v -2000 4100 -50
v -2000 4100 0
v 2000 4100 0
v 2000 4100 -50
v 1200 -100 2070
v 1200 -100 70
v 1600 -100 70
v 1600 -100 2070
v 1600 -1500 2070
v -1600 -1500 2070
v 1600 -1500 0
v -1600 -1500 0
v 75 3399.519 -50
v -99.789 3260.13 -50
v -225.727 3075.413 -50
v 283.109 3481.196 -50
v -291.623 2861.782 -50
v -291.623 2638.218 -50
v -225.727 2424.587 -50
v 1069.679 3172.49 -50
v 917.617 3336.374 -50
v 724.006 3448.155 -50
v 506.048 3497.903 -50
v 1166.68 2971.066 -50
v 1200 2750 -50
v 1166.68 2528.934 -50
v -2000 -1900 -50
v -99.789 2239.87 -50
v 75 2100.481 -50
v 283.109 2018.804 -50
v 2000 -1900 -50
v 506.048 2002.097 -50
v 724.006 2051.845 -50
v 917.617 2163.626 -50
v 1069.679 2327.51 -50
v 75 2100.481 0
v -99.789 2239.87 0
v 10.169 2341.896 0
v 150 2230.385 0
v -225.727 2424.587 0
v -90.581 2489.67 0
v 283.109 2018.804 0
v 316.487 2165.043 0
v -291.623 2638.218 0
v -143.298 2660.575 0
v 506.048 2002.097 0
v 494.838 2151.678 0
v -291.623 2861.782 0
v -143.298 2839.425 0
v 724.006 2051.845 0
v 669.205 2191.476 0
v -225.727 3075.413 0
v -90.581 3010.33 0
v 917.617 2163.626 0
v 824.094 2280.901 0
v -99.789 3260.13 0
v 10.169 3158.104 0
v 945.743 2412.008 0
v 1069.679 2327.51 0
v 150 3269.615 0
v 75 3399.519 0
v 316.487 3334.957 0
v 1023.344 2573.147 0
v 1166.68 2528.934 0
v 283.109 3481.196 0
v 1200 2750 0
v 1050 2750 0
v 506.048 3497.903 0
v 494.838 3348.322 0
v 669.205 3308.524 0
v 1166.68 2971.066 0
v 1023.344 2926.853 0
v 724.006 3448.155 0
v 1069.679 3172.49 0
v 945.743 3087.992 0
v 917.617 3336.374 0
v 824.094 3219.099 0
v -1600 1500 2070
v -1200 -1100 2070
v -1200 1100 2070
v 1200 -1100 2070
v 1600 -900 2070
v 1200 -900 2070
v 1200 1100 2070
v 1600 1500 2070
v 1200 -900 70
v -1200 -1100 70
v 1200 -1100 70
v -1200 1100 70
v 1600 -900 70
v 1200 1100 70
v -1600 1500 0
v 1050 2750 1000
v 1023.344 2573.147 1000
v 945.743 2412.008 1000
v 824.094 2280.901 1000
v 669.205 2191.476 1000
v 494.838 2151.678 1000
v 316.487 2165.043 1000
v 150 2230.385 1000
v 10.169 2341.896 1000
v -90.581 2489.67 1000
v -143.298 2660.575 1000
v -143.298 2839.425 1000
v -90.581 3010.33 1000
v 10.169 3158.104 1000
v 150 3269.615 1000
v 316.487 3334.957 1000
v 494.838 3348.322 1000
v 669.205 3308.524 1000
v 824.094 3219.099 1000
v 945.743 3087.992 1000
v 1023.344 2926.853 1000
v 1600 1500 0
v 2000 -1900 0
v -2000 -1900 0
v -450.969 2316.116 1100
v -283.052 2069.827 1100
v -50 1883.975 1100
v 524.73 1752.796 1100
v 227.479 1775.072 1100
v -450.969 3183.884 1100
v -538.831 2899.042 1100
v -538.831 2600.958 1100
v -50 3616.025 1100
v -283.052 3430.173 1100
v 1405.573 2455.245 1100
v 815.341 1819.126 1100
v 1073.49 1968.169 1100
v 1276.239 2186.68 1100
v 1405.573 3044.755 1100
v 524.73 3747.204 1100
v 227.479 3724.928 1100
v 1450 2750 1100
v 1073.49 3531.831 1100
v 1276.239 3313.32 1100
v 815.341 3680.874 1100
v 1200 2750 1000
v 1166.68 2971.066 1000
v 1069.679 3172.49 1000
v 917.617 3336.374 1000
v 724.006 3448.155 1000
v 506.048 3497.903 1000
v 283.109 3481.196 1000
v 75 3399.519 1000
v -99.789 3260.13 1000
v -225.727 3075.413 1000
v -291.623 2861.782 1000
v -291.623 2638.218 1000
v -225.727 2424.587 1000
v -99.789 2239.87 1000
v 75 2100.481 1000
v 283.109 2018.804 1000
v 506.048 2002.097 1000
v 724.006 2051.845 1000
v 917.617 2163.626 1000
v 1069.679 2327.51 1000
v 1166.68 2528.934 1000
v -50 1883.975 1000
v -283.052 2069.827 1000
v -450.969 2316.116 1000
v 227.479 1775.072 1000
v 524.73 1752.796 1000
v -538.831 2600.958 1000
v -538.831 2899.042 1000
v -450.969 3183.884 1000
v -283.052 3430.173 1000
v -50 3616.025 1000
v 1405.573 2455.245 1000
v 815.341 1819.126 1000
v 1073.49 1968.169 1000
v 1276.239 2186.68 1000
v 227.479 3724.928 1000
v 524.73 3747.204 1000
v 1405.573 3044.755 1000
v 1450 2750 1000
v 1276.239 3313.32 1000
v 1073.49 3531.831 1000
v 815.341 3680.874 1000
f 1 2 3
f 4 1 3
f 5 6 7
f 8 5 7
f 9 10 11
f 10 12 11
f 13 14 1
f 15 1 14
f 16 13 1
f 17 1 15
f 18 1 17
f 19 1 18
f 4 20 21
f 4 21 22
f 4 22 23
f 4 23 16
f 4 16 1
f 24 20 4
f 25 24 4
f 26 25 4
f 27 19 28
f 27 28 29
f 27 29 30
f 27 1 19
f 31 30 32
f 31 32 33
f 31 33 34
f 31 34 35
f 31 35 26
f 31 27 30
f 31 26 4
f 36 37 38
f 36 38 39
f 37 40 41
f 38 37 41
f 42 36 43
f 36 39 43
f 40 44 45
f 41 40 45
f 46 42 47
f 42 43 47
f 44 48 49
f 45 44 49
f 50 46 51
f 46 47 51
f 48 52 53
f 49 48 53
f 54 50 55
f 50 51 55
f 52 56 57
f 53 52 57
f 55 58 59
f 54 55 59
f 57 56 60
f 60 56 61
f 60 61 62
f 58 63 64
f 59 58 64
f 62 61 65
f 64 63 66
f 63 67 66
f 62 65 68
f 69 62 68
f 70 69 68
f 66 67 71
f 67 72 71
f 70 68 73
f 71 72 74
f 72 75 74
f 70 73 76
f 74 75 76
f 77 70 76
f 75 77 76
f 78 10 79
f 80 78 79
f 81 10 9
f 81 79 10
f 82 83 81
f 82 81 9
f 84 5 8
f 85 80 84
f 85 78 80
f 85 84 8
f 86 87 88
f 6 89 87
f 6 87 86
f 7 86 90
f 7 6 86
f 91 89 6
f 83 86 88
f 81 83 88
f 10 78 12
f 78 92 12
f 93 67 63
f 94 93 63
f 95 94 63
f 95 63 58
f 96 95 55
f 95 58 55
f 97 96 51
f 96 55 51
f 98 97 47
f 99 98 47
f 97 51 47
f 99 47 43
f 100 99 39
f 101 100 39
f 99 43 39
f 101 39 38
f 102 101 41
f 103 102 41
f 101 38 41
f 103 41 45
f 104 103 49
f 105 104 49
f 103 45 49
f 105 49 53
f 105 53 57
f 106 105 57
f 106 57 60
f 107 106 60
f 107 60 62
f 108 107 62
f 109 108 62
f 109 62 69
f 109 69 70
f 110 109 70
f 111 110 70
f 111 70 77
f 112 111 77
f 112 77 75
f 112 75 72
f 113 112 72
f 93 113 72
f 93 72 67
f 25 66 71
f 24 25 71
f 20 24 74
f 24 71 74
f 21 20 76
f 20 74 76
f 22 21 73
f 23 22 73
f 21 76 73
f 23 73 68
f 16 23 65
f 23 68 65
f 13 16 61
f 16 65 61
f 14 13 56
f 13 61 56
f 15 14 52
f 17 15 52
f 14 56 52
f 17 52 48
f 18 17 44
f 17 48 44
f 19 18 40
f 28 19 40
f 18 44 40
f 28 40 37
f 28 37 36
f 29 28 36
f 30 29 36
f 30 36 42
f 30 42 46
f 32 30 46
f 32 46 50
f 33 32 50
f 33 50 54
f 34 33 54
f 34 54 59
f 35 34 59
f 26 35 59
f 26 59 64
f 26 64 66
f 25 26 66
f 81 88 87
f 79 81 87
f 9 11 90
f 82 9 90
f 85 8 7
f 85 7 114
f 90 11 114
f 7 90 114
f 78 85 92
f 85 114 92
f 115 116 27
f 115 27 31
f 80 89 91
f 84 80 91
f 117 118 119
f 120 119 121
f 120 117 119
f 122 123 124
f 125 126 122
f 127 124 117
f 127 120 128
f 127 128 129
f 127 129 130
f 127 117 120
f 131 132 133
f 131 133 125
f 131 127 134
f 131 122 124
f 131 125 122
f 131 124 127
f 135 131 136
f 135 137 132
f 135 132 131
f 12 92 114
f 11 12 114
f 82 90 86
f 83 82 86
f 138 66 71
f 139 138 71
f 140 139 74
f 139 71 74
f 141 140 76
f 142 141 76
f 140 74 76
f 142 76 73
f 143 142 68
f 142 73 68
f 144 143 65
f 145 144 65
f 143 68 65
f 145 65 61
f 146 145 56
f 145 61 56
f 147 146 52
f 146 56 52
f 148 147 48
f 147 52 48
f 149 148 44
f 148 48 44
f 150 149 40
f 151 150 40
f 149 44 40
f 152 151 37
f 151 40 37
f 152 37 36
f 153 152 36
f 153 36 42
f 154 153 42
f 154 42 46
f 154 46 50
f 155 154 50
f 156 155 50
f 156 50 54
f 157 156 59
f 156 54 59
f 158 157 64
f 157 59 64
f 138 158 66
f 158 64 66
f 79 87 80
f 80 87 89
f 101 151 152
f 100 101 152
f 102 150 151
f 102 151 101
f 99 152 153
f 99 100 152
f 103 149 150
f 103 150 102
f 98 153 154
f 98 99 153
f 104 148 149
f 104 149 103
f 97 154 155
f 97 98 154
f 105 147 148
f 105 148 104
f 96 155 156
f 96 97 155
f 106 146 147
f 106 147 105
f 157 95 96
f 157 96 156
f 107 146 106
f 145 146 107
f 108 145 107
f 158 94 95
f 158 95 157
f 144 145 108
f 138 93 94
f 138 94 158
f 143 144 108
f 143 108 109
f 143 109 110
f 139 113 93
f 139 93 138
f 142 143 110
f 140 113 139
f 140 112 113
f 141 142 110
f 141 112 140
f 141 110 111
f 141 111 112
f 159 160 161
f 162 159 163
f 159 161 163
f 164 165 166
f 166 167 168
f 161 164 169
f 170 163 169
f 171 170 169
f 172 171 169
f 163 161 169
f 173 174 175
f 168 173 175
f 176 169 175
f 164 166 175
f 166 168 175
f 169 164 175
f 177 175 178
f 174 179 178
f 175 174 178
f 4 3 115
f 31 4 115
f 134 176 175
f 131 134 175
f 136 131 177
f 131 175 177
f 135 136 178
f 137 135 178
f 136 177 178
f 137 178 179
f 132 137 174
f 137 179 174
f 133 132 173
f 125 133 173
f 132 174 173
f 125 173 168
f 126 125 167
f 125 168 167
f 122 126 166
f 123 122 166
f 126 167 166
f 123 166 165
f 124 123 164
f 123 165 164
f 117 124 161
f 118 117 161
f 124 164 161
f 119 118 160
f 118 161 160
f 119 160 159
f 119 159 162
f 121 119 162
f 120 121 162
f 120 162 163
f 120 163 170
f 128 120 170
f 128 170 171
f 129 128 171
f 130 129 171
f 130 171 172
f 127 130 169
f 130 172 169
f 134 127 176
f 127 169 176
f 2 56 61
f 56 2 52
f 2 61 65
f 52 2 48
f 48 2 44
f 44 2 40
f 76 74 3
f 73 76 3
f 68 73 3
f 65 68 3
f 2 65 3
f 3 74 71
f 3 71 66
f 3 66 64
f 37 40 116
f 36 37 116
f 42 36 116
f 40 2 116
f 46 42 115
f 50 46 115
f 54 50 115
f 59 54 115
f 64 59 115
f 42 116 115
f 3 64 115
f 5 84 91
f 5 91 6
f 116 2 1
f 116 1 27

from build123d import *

# Parameters (mm, degrees)
F0_W      = 3200
F0_H      = 3000
F1_DEPTH  = 70
F3_DEPTH  = 2000
F4_W      = 4000
F4_H      = 6000
F5_DEPTH  = 50
F6_R      = 750
F7_DEPTH  = 500
F8_DEPTH  = 1000
F9_R      = 1000
F10_DEPTH = 100
F11_R     = 600
F12_DEPTH = 2070.001


with BuildPart() as f1:
    # F0 (on Top) → F1 (new body)
    with BuildSketch(Plane.XY):
        Rectangle(F0_W, F0_H)
    extrude(amount=F1_DEPTH)

    # F2 (on face) → F3 (join)
    with BuildSketch(Plane.XY.offset(70)):
        Polygon((1200, -1100), (-1200, -1100), (-1200, 1100), (1200, 1100), (1200, -100), (1600, -100), (1600, 1500), (-1600, 1500), (-1600, -1500), (1600, -1500), (1600, -900), (1200, -900), align=None)
    extrude(amount=F3_DEPTH)


with BuildPart() as f5:
    # F4 (on face) → F5 (new body)
    with BuildSketch(Plane(origin=(0, 0, 0), x_dir=(1, 0, 0), z_dir=(0, 0, -1))):
        with Locations((0, -1100)):
            Rectangle(F4_W, F4_H)
    extrude(amount=F5_DEPTH)

    # F6 (on face) → F7 (cut)
    with BuildSketch(Plane.XY):
        with Locations((450, 2750)):
            Circle(F6_R)
    extrude(amount=-F7_DEPTH, mode=Mode.SUBTRACT)


with BuildPart() as f8:
    # F6 (on face) → F8 (new body)
    with BuildSketch(Plane.XY):
        with Locations((450, 2750)):
            Circle(F6_R)
    extrude(amount=F8_DEPTH)

    # F11 (on face) → F12 (cut, through all)
    with BuildSketch(Plane(origin=(0, 0, 0), x_dir=(1, 0, 0), z_dir=(0, 0, -1))):
        with Locations((450, -2750)):
            Circle(F11_R)
    extrude(amount=-F12_DEPTH, mode=Mode.SUBTRACT)


with BuildPart() as f10:
    # F9 (on face) → F10 (new body)
    with BuildSketch(Plane.XY.offset(1000)):
        with Locations((450, 2750)):
            Circle(F9_R)
    extrude(amount=F10_DEPTH)


solid = Compound([f1.part, f5.part, f8.part, f10.part])
